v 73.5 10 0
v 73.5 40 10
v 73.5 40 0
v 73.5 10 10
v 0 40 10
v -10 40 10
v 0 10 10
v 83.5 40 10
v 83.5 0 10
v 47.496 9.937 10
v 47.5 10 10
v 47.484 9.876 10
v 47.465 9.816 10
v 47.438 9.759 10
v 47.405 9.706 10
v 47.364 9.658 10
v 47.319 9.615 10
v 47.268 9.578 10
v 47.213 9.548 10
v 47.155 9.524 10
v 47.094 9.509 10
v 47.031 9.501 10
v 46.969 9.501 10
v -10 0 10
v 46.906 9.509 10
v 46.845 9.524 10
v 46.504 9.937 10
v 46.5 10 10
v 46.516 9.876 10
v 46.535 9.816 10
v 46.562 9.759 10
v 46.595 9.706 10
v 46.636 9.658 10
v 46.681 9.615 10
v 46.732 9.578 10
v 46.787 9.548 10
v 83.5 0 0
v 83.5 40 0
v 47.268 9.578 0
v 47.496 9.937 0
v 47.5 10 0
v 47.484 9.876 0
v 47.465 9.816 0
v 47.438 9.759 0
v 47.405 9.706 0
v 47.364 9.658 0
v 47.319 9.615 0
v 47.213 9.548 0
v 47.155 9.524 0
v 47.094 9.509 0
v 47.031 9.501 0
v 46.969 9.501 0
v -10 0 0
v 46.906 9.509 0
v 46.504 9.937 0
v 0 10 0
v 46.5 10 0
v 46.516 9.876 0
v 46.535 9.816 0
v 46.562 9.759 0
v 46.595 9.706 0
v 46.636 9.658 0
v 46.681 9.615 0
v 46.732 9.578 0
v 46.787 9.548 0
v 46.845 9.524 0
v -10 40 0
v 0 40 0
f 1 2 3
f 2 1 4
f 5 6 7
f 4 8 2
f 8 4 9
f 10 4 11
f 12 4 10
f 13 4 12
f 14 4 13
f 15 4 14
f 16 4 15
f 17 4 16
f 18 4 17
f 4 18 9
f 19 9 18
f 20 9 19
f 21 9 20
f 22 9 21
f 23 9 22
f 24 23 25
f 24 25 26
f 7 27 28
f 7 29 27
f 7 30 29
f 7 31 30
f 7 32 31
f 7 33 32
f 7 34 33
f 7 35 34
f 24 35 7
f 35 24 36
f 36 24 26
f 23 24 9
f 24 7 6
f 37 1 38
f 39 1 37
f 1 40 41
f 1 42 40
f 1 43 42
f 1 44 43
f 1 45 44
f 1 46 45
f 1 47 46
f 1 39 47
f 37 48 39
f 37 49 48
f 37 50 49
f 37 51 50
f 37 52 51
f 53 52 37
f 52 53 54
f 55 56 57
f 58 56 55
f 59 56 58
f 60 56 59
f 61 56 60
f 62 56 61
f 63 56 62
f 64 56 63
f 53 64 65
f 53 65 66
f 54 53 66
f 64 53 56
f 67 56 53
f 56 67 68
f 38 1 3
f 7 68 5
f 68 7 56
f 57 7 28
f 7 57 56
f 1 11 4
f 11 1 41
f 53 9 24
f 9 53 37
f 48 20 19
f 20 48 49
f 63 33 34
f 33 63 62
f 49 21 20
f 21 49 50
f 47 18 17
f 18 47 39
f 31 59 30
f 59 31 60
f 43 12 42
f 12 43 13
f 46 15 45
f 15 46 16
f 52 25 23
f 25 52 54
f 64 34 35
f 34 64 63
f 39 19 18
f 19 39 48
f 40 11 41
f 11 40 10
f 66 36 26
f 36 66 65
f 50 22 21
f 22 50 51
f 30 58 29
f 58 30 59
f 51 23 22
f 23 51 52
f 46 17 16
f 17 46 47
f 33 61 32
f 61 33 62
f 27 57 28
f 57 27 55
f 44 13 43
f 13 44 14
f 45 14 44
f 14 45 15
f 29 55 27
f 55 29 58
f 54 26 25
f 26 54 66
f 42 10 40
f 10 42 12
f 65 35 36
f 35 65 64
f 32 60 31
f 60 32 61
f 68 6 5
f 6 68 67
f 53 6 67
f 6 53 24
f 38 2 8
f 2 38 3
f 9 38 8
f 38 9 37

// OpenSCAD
$fn=50;

//rotate([90,0,0])holder();
//translate([130,0,0])rotate([90,0,0])mirror()holder();
 
distance = 73.5;
edge = 40;
thick = 10;
groove_pos = 47;
difference () {
    part(distance);
    translate([groove_pos,thick,0])cylinder(thick,r1=0.5,r2=0.5);
}
rotate(90,0,0)part(edge);
translate([distance+thick,0,0])rotate(90,0,0)part(edge);

module part(l) {
  cube([l,thick,thick]);
}
module holder(){
h=7;
x=40;
y=100;

rn=3.5;

difference(){
hull(){
cube([x,y,h+3+3]);
translate([rn,rn,h+6])sphere(6);
translate([rn,rn,h+6])sphere(6);
translate([x-rn,rn,h+6])sphere(6);

translate([rn,y-rn,h+6])sphere(6);
translate([x-rn,y-rn,h+6])sphere(6);

}


translate([5,y+5,h+9])
rotate([180,0,0])
hull(){
cube([x,y,h]);
translate([rn,rn,h])sphere(6);
translate([rn,rn,h])sphere(6);
translate([x-rn,rn,h])sphere(6);
translate([rn,y-rn,h])sphere(6);
translate([x-rn,y-rn,h])sphere(6);

}

translate([20,25,h])cube([x,y,h+10]);

translate([x/2,y-16,0])cylinder(h=5,r1=1,r2=7);
translate([x/2,y-70,0])cylinder(h=5,r1=1,r2=7);

translate([45,40,-0.1])cube([x,y,h]);

translate([x-2,21,h+5])sg();
translate([x-44,y-2,h+5])sg();

translate([x-19,y-4,-0.1])sg();
translate([x-3,y-64,-0.1])sg();

translate([5,y,0])rotate([45,0,0])cube([x,4,4]);
}
}


module sg(){
	difference(){
	cube([10,10,10]);
	cylinder(h=10,r=4);
}
}
